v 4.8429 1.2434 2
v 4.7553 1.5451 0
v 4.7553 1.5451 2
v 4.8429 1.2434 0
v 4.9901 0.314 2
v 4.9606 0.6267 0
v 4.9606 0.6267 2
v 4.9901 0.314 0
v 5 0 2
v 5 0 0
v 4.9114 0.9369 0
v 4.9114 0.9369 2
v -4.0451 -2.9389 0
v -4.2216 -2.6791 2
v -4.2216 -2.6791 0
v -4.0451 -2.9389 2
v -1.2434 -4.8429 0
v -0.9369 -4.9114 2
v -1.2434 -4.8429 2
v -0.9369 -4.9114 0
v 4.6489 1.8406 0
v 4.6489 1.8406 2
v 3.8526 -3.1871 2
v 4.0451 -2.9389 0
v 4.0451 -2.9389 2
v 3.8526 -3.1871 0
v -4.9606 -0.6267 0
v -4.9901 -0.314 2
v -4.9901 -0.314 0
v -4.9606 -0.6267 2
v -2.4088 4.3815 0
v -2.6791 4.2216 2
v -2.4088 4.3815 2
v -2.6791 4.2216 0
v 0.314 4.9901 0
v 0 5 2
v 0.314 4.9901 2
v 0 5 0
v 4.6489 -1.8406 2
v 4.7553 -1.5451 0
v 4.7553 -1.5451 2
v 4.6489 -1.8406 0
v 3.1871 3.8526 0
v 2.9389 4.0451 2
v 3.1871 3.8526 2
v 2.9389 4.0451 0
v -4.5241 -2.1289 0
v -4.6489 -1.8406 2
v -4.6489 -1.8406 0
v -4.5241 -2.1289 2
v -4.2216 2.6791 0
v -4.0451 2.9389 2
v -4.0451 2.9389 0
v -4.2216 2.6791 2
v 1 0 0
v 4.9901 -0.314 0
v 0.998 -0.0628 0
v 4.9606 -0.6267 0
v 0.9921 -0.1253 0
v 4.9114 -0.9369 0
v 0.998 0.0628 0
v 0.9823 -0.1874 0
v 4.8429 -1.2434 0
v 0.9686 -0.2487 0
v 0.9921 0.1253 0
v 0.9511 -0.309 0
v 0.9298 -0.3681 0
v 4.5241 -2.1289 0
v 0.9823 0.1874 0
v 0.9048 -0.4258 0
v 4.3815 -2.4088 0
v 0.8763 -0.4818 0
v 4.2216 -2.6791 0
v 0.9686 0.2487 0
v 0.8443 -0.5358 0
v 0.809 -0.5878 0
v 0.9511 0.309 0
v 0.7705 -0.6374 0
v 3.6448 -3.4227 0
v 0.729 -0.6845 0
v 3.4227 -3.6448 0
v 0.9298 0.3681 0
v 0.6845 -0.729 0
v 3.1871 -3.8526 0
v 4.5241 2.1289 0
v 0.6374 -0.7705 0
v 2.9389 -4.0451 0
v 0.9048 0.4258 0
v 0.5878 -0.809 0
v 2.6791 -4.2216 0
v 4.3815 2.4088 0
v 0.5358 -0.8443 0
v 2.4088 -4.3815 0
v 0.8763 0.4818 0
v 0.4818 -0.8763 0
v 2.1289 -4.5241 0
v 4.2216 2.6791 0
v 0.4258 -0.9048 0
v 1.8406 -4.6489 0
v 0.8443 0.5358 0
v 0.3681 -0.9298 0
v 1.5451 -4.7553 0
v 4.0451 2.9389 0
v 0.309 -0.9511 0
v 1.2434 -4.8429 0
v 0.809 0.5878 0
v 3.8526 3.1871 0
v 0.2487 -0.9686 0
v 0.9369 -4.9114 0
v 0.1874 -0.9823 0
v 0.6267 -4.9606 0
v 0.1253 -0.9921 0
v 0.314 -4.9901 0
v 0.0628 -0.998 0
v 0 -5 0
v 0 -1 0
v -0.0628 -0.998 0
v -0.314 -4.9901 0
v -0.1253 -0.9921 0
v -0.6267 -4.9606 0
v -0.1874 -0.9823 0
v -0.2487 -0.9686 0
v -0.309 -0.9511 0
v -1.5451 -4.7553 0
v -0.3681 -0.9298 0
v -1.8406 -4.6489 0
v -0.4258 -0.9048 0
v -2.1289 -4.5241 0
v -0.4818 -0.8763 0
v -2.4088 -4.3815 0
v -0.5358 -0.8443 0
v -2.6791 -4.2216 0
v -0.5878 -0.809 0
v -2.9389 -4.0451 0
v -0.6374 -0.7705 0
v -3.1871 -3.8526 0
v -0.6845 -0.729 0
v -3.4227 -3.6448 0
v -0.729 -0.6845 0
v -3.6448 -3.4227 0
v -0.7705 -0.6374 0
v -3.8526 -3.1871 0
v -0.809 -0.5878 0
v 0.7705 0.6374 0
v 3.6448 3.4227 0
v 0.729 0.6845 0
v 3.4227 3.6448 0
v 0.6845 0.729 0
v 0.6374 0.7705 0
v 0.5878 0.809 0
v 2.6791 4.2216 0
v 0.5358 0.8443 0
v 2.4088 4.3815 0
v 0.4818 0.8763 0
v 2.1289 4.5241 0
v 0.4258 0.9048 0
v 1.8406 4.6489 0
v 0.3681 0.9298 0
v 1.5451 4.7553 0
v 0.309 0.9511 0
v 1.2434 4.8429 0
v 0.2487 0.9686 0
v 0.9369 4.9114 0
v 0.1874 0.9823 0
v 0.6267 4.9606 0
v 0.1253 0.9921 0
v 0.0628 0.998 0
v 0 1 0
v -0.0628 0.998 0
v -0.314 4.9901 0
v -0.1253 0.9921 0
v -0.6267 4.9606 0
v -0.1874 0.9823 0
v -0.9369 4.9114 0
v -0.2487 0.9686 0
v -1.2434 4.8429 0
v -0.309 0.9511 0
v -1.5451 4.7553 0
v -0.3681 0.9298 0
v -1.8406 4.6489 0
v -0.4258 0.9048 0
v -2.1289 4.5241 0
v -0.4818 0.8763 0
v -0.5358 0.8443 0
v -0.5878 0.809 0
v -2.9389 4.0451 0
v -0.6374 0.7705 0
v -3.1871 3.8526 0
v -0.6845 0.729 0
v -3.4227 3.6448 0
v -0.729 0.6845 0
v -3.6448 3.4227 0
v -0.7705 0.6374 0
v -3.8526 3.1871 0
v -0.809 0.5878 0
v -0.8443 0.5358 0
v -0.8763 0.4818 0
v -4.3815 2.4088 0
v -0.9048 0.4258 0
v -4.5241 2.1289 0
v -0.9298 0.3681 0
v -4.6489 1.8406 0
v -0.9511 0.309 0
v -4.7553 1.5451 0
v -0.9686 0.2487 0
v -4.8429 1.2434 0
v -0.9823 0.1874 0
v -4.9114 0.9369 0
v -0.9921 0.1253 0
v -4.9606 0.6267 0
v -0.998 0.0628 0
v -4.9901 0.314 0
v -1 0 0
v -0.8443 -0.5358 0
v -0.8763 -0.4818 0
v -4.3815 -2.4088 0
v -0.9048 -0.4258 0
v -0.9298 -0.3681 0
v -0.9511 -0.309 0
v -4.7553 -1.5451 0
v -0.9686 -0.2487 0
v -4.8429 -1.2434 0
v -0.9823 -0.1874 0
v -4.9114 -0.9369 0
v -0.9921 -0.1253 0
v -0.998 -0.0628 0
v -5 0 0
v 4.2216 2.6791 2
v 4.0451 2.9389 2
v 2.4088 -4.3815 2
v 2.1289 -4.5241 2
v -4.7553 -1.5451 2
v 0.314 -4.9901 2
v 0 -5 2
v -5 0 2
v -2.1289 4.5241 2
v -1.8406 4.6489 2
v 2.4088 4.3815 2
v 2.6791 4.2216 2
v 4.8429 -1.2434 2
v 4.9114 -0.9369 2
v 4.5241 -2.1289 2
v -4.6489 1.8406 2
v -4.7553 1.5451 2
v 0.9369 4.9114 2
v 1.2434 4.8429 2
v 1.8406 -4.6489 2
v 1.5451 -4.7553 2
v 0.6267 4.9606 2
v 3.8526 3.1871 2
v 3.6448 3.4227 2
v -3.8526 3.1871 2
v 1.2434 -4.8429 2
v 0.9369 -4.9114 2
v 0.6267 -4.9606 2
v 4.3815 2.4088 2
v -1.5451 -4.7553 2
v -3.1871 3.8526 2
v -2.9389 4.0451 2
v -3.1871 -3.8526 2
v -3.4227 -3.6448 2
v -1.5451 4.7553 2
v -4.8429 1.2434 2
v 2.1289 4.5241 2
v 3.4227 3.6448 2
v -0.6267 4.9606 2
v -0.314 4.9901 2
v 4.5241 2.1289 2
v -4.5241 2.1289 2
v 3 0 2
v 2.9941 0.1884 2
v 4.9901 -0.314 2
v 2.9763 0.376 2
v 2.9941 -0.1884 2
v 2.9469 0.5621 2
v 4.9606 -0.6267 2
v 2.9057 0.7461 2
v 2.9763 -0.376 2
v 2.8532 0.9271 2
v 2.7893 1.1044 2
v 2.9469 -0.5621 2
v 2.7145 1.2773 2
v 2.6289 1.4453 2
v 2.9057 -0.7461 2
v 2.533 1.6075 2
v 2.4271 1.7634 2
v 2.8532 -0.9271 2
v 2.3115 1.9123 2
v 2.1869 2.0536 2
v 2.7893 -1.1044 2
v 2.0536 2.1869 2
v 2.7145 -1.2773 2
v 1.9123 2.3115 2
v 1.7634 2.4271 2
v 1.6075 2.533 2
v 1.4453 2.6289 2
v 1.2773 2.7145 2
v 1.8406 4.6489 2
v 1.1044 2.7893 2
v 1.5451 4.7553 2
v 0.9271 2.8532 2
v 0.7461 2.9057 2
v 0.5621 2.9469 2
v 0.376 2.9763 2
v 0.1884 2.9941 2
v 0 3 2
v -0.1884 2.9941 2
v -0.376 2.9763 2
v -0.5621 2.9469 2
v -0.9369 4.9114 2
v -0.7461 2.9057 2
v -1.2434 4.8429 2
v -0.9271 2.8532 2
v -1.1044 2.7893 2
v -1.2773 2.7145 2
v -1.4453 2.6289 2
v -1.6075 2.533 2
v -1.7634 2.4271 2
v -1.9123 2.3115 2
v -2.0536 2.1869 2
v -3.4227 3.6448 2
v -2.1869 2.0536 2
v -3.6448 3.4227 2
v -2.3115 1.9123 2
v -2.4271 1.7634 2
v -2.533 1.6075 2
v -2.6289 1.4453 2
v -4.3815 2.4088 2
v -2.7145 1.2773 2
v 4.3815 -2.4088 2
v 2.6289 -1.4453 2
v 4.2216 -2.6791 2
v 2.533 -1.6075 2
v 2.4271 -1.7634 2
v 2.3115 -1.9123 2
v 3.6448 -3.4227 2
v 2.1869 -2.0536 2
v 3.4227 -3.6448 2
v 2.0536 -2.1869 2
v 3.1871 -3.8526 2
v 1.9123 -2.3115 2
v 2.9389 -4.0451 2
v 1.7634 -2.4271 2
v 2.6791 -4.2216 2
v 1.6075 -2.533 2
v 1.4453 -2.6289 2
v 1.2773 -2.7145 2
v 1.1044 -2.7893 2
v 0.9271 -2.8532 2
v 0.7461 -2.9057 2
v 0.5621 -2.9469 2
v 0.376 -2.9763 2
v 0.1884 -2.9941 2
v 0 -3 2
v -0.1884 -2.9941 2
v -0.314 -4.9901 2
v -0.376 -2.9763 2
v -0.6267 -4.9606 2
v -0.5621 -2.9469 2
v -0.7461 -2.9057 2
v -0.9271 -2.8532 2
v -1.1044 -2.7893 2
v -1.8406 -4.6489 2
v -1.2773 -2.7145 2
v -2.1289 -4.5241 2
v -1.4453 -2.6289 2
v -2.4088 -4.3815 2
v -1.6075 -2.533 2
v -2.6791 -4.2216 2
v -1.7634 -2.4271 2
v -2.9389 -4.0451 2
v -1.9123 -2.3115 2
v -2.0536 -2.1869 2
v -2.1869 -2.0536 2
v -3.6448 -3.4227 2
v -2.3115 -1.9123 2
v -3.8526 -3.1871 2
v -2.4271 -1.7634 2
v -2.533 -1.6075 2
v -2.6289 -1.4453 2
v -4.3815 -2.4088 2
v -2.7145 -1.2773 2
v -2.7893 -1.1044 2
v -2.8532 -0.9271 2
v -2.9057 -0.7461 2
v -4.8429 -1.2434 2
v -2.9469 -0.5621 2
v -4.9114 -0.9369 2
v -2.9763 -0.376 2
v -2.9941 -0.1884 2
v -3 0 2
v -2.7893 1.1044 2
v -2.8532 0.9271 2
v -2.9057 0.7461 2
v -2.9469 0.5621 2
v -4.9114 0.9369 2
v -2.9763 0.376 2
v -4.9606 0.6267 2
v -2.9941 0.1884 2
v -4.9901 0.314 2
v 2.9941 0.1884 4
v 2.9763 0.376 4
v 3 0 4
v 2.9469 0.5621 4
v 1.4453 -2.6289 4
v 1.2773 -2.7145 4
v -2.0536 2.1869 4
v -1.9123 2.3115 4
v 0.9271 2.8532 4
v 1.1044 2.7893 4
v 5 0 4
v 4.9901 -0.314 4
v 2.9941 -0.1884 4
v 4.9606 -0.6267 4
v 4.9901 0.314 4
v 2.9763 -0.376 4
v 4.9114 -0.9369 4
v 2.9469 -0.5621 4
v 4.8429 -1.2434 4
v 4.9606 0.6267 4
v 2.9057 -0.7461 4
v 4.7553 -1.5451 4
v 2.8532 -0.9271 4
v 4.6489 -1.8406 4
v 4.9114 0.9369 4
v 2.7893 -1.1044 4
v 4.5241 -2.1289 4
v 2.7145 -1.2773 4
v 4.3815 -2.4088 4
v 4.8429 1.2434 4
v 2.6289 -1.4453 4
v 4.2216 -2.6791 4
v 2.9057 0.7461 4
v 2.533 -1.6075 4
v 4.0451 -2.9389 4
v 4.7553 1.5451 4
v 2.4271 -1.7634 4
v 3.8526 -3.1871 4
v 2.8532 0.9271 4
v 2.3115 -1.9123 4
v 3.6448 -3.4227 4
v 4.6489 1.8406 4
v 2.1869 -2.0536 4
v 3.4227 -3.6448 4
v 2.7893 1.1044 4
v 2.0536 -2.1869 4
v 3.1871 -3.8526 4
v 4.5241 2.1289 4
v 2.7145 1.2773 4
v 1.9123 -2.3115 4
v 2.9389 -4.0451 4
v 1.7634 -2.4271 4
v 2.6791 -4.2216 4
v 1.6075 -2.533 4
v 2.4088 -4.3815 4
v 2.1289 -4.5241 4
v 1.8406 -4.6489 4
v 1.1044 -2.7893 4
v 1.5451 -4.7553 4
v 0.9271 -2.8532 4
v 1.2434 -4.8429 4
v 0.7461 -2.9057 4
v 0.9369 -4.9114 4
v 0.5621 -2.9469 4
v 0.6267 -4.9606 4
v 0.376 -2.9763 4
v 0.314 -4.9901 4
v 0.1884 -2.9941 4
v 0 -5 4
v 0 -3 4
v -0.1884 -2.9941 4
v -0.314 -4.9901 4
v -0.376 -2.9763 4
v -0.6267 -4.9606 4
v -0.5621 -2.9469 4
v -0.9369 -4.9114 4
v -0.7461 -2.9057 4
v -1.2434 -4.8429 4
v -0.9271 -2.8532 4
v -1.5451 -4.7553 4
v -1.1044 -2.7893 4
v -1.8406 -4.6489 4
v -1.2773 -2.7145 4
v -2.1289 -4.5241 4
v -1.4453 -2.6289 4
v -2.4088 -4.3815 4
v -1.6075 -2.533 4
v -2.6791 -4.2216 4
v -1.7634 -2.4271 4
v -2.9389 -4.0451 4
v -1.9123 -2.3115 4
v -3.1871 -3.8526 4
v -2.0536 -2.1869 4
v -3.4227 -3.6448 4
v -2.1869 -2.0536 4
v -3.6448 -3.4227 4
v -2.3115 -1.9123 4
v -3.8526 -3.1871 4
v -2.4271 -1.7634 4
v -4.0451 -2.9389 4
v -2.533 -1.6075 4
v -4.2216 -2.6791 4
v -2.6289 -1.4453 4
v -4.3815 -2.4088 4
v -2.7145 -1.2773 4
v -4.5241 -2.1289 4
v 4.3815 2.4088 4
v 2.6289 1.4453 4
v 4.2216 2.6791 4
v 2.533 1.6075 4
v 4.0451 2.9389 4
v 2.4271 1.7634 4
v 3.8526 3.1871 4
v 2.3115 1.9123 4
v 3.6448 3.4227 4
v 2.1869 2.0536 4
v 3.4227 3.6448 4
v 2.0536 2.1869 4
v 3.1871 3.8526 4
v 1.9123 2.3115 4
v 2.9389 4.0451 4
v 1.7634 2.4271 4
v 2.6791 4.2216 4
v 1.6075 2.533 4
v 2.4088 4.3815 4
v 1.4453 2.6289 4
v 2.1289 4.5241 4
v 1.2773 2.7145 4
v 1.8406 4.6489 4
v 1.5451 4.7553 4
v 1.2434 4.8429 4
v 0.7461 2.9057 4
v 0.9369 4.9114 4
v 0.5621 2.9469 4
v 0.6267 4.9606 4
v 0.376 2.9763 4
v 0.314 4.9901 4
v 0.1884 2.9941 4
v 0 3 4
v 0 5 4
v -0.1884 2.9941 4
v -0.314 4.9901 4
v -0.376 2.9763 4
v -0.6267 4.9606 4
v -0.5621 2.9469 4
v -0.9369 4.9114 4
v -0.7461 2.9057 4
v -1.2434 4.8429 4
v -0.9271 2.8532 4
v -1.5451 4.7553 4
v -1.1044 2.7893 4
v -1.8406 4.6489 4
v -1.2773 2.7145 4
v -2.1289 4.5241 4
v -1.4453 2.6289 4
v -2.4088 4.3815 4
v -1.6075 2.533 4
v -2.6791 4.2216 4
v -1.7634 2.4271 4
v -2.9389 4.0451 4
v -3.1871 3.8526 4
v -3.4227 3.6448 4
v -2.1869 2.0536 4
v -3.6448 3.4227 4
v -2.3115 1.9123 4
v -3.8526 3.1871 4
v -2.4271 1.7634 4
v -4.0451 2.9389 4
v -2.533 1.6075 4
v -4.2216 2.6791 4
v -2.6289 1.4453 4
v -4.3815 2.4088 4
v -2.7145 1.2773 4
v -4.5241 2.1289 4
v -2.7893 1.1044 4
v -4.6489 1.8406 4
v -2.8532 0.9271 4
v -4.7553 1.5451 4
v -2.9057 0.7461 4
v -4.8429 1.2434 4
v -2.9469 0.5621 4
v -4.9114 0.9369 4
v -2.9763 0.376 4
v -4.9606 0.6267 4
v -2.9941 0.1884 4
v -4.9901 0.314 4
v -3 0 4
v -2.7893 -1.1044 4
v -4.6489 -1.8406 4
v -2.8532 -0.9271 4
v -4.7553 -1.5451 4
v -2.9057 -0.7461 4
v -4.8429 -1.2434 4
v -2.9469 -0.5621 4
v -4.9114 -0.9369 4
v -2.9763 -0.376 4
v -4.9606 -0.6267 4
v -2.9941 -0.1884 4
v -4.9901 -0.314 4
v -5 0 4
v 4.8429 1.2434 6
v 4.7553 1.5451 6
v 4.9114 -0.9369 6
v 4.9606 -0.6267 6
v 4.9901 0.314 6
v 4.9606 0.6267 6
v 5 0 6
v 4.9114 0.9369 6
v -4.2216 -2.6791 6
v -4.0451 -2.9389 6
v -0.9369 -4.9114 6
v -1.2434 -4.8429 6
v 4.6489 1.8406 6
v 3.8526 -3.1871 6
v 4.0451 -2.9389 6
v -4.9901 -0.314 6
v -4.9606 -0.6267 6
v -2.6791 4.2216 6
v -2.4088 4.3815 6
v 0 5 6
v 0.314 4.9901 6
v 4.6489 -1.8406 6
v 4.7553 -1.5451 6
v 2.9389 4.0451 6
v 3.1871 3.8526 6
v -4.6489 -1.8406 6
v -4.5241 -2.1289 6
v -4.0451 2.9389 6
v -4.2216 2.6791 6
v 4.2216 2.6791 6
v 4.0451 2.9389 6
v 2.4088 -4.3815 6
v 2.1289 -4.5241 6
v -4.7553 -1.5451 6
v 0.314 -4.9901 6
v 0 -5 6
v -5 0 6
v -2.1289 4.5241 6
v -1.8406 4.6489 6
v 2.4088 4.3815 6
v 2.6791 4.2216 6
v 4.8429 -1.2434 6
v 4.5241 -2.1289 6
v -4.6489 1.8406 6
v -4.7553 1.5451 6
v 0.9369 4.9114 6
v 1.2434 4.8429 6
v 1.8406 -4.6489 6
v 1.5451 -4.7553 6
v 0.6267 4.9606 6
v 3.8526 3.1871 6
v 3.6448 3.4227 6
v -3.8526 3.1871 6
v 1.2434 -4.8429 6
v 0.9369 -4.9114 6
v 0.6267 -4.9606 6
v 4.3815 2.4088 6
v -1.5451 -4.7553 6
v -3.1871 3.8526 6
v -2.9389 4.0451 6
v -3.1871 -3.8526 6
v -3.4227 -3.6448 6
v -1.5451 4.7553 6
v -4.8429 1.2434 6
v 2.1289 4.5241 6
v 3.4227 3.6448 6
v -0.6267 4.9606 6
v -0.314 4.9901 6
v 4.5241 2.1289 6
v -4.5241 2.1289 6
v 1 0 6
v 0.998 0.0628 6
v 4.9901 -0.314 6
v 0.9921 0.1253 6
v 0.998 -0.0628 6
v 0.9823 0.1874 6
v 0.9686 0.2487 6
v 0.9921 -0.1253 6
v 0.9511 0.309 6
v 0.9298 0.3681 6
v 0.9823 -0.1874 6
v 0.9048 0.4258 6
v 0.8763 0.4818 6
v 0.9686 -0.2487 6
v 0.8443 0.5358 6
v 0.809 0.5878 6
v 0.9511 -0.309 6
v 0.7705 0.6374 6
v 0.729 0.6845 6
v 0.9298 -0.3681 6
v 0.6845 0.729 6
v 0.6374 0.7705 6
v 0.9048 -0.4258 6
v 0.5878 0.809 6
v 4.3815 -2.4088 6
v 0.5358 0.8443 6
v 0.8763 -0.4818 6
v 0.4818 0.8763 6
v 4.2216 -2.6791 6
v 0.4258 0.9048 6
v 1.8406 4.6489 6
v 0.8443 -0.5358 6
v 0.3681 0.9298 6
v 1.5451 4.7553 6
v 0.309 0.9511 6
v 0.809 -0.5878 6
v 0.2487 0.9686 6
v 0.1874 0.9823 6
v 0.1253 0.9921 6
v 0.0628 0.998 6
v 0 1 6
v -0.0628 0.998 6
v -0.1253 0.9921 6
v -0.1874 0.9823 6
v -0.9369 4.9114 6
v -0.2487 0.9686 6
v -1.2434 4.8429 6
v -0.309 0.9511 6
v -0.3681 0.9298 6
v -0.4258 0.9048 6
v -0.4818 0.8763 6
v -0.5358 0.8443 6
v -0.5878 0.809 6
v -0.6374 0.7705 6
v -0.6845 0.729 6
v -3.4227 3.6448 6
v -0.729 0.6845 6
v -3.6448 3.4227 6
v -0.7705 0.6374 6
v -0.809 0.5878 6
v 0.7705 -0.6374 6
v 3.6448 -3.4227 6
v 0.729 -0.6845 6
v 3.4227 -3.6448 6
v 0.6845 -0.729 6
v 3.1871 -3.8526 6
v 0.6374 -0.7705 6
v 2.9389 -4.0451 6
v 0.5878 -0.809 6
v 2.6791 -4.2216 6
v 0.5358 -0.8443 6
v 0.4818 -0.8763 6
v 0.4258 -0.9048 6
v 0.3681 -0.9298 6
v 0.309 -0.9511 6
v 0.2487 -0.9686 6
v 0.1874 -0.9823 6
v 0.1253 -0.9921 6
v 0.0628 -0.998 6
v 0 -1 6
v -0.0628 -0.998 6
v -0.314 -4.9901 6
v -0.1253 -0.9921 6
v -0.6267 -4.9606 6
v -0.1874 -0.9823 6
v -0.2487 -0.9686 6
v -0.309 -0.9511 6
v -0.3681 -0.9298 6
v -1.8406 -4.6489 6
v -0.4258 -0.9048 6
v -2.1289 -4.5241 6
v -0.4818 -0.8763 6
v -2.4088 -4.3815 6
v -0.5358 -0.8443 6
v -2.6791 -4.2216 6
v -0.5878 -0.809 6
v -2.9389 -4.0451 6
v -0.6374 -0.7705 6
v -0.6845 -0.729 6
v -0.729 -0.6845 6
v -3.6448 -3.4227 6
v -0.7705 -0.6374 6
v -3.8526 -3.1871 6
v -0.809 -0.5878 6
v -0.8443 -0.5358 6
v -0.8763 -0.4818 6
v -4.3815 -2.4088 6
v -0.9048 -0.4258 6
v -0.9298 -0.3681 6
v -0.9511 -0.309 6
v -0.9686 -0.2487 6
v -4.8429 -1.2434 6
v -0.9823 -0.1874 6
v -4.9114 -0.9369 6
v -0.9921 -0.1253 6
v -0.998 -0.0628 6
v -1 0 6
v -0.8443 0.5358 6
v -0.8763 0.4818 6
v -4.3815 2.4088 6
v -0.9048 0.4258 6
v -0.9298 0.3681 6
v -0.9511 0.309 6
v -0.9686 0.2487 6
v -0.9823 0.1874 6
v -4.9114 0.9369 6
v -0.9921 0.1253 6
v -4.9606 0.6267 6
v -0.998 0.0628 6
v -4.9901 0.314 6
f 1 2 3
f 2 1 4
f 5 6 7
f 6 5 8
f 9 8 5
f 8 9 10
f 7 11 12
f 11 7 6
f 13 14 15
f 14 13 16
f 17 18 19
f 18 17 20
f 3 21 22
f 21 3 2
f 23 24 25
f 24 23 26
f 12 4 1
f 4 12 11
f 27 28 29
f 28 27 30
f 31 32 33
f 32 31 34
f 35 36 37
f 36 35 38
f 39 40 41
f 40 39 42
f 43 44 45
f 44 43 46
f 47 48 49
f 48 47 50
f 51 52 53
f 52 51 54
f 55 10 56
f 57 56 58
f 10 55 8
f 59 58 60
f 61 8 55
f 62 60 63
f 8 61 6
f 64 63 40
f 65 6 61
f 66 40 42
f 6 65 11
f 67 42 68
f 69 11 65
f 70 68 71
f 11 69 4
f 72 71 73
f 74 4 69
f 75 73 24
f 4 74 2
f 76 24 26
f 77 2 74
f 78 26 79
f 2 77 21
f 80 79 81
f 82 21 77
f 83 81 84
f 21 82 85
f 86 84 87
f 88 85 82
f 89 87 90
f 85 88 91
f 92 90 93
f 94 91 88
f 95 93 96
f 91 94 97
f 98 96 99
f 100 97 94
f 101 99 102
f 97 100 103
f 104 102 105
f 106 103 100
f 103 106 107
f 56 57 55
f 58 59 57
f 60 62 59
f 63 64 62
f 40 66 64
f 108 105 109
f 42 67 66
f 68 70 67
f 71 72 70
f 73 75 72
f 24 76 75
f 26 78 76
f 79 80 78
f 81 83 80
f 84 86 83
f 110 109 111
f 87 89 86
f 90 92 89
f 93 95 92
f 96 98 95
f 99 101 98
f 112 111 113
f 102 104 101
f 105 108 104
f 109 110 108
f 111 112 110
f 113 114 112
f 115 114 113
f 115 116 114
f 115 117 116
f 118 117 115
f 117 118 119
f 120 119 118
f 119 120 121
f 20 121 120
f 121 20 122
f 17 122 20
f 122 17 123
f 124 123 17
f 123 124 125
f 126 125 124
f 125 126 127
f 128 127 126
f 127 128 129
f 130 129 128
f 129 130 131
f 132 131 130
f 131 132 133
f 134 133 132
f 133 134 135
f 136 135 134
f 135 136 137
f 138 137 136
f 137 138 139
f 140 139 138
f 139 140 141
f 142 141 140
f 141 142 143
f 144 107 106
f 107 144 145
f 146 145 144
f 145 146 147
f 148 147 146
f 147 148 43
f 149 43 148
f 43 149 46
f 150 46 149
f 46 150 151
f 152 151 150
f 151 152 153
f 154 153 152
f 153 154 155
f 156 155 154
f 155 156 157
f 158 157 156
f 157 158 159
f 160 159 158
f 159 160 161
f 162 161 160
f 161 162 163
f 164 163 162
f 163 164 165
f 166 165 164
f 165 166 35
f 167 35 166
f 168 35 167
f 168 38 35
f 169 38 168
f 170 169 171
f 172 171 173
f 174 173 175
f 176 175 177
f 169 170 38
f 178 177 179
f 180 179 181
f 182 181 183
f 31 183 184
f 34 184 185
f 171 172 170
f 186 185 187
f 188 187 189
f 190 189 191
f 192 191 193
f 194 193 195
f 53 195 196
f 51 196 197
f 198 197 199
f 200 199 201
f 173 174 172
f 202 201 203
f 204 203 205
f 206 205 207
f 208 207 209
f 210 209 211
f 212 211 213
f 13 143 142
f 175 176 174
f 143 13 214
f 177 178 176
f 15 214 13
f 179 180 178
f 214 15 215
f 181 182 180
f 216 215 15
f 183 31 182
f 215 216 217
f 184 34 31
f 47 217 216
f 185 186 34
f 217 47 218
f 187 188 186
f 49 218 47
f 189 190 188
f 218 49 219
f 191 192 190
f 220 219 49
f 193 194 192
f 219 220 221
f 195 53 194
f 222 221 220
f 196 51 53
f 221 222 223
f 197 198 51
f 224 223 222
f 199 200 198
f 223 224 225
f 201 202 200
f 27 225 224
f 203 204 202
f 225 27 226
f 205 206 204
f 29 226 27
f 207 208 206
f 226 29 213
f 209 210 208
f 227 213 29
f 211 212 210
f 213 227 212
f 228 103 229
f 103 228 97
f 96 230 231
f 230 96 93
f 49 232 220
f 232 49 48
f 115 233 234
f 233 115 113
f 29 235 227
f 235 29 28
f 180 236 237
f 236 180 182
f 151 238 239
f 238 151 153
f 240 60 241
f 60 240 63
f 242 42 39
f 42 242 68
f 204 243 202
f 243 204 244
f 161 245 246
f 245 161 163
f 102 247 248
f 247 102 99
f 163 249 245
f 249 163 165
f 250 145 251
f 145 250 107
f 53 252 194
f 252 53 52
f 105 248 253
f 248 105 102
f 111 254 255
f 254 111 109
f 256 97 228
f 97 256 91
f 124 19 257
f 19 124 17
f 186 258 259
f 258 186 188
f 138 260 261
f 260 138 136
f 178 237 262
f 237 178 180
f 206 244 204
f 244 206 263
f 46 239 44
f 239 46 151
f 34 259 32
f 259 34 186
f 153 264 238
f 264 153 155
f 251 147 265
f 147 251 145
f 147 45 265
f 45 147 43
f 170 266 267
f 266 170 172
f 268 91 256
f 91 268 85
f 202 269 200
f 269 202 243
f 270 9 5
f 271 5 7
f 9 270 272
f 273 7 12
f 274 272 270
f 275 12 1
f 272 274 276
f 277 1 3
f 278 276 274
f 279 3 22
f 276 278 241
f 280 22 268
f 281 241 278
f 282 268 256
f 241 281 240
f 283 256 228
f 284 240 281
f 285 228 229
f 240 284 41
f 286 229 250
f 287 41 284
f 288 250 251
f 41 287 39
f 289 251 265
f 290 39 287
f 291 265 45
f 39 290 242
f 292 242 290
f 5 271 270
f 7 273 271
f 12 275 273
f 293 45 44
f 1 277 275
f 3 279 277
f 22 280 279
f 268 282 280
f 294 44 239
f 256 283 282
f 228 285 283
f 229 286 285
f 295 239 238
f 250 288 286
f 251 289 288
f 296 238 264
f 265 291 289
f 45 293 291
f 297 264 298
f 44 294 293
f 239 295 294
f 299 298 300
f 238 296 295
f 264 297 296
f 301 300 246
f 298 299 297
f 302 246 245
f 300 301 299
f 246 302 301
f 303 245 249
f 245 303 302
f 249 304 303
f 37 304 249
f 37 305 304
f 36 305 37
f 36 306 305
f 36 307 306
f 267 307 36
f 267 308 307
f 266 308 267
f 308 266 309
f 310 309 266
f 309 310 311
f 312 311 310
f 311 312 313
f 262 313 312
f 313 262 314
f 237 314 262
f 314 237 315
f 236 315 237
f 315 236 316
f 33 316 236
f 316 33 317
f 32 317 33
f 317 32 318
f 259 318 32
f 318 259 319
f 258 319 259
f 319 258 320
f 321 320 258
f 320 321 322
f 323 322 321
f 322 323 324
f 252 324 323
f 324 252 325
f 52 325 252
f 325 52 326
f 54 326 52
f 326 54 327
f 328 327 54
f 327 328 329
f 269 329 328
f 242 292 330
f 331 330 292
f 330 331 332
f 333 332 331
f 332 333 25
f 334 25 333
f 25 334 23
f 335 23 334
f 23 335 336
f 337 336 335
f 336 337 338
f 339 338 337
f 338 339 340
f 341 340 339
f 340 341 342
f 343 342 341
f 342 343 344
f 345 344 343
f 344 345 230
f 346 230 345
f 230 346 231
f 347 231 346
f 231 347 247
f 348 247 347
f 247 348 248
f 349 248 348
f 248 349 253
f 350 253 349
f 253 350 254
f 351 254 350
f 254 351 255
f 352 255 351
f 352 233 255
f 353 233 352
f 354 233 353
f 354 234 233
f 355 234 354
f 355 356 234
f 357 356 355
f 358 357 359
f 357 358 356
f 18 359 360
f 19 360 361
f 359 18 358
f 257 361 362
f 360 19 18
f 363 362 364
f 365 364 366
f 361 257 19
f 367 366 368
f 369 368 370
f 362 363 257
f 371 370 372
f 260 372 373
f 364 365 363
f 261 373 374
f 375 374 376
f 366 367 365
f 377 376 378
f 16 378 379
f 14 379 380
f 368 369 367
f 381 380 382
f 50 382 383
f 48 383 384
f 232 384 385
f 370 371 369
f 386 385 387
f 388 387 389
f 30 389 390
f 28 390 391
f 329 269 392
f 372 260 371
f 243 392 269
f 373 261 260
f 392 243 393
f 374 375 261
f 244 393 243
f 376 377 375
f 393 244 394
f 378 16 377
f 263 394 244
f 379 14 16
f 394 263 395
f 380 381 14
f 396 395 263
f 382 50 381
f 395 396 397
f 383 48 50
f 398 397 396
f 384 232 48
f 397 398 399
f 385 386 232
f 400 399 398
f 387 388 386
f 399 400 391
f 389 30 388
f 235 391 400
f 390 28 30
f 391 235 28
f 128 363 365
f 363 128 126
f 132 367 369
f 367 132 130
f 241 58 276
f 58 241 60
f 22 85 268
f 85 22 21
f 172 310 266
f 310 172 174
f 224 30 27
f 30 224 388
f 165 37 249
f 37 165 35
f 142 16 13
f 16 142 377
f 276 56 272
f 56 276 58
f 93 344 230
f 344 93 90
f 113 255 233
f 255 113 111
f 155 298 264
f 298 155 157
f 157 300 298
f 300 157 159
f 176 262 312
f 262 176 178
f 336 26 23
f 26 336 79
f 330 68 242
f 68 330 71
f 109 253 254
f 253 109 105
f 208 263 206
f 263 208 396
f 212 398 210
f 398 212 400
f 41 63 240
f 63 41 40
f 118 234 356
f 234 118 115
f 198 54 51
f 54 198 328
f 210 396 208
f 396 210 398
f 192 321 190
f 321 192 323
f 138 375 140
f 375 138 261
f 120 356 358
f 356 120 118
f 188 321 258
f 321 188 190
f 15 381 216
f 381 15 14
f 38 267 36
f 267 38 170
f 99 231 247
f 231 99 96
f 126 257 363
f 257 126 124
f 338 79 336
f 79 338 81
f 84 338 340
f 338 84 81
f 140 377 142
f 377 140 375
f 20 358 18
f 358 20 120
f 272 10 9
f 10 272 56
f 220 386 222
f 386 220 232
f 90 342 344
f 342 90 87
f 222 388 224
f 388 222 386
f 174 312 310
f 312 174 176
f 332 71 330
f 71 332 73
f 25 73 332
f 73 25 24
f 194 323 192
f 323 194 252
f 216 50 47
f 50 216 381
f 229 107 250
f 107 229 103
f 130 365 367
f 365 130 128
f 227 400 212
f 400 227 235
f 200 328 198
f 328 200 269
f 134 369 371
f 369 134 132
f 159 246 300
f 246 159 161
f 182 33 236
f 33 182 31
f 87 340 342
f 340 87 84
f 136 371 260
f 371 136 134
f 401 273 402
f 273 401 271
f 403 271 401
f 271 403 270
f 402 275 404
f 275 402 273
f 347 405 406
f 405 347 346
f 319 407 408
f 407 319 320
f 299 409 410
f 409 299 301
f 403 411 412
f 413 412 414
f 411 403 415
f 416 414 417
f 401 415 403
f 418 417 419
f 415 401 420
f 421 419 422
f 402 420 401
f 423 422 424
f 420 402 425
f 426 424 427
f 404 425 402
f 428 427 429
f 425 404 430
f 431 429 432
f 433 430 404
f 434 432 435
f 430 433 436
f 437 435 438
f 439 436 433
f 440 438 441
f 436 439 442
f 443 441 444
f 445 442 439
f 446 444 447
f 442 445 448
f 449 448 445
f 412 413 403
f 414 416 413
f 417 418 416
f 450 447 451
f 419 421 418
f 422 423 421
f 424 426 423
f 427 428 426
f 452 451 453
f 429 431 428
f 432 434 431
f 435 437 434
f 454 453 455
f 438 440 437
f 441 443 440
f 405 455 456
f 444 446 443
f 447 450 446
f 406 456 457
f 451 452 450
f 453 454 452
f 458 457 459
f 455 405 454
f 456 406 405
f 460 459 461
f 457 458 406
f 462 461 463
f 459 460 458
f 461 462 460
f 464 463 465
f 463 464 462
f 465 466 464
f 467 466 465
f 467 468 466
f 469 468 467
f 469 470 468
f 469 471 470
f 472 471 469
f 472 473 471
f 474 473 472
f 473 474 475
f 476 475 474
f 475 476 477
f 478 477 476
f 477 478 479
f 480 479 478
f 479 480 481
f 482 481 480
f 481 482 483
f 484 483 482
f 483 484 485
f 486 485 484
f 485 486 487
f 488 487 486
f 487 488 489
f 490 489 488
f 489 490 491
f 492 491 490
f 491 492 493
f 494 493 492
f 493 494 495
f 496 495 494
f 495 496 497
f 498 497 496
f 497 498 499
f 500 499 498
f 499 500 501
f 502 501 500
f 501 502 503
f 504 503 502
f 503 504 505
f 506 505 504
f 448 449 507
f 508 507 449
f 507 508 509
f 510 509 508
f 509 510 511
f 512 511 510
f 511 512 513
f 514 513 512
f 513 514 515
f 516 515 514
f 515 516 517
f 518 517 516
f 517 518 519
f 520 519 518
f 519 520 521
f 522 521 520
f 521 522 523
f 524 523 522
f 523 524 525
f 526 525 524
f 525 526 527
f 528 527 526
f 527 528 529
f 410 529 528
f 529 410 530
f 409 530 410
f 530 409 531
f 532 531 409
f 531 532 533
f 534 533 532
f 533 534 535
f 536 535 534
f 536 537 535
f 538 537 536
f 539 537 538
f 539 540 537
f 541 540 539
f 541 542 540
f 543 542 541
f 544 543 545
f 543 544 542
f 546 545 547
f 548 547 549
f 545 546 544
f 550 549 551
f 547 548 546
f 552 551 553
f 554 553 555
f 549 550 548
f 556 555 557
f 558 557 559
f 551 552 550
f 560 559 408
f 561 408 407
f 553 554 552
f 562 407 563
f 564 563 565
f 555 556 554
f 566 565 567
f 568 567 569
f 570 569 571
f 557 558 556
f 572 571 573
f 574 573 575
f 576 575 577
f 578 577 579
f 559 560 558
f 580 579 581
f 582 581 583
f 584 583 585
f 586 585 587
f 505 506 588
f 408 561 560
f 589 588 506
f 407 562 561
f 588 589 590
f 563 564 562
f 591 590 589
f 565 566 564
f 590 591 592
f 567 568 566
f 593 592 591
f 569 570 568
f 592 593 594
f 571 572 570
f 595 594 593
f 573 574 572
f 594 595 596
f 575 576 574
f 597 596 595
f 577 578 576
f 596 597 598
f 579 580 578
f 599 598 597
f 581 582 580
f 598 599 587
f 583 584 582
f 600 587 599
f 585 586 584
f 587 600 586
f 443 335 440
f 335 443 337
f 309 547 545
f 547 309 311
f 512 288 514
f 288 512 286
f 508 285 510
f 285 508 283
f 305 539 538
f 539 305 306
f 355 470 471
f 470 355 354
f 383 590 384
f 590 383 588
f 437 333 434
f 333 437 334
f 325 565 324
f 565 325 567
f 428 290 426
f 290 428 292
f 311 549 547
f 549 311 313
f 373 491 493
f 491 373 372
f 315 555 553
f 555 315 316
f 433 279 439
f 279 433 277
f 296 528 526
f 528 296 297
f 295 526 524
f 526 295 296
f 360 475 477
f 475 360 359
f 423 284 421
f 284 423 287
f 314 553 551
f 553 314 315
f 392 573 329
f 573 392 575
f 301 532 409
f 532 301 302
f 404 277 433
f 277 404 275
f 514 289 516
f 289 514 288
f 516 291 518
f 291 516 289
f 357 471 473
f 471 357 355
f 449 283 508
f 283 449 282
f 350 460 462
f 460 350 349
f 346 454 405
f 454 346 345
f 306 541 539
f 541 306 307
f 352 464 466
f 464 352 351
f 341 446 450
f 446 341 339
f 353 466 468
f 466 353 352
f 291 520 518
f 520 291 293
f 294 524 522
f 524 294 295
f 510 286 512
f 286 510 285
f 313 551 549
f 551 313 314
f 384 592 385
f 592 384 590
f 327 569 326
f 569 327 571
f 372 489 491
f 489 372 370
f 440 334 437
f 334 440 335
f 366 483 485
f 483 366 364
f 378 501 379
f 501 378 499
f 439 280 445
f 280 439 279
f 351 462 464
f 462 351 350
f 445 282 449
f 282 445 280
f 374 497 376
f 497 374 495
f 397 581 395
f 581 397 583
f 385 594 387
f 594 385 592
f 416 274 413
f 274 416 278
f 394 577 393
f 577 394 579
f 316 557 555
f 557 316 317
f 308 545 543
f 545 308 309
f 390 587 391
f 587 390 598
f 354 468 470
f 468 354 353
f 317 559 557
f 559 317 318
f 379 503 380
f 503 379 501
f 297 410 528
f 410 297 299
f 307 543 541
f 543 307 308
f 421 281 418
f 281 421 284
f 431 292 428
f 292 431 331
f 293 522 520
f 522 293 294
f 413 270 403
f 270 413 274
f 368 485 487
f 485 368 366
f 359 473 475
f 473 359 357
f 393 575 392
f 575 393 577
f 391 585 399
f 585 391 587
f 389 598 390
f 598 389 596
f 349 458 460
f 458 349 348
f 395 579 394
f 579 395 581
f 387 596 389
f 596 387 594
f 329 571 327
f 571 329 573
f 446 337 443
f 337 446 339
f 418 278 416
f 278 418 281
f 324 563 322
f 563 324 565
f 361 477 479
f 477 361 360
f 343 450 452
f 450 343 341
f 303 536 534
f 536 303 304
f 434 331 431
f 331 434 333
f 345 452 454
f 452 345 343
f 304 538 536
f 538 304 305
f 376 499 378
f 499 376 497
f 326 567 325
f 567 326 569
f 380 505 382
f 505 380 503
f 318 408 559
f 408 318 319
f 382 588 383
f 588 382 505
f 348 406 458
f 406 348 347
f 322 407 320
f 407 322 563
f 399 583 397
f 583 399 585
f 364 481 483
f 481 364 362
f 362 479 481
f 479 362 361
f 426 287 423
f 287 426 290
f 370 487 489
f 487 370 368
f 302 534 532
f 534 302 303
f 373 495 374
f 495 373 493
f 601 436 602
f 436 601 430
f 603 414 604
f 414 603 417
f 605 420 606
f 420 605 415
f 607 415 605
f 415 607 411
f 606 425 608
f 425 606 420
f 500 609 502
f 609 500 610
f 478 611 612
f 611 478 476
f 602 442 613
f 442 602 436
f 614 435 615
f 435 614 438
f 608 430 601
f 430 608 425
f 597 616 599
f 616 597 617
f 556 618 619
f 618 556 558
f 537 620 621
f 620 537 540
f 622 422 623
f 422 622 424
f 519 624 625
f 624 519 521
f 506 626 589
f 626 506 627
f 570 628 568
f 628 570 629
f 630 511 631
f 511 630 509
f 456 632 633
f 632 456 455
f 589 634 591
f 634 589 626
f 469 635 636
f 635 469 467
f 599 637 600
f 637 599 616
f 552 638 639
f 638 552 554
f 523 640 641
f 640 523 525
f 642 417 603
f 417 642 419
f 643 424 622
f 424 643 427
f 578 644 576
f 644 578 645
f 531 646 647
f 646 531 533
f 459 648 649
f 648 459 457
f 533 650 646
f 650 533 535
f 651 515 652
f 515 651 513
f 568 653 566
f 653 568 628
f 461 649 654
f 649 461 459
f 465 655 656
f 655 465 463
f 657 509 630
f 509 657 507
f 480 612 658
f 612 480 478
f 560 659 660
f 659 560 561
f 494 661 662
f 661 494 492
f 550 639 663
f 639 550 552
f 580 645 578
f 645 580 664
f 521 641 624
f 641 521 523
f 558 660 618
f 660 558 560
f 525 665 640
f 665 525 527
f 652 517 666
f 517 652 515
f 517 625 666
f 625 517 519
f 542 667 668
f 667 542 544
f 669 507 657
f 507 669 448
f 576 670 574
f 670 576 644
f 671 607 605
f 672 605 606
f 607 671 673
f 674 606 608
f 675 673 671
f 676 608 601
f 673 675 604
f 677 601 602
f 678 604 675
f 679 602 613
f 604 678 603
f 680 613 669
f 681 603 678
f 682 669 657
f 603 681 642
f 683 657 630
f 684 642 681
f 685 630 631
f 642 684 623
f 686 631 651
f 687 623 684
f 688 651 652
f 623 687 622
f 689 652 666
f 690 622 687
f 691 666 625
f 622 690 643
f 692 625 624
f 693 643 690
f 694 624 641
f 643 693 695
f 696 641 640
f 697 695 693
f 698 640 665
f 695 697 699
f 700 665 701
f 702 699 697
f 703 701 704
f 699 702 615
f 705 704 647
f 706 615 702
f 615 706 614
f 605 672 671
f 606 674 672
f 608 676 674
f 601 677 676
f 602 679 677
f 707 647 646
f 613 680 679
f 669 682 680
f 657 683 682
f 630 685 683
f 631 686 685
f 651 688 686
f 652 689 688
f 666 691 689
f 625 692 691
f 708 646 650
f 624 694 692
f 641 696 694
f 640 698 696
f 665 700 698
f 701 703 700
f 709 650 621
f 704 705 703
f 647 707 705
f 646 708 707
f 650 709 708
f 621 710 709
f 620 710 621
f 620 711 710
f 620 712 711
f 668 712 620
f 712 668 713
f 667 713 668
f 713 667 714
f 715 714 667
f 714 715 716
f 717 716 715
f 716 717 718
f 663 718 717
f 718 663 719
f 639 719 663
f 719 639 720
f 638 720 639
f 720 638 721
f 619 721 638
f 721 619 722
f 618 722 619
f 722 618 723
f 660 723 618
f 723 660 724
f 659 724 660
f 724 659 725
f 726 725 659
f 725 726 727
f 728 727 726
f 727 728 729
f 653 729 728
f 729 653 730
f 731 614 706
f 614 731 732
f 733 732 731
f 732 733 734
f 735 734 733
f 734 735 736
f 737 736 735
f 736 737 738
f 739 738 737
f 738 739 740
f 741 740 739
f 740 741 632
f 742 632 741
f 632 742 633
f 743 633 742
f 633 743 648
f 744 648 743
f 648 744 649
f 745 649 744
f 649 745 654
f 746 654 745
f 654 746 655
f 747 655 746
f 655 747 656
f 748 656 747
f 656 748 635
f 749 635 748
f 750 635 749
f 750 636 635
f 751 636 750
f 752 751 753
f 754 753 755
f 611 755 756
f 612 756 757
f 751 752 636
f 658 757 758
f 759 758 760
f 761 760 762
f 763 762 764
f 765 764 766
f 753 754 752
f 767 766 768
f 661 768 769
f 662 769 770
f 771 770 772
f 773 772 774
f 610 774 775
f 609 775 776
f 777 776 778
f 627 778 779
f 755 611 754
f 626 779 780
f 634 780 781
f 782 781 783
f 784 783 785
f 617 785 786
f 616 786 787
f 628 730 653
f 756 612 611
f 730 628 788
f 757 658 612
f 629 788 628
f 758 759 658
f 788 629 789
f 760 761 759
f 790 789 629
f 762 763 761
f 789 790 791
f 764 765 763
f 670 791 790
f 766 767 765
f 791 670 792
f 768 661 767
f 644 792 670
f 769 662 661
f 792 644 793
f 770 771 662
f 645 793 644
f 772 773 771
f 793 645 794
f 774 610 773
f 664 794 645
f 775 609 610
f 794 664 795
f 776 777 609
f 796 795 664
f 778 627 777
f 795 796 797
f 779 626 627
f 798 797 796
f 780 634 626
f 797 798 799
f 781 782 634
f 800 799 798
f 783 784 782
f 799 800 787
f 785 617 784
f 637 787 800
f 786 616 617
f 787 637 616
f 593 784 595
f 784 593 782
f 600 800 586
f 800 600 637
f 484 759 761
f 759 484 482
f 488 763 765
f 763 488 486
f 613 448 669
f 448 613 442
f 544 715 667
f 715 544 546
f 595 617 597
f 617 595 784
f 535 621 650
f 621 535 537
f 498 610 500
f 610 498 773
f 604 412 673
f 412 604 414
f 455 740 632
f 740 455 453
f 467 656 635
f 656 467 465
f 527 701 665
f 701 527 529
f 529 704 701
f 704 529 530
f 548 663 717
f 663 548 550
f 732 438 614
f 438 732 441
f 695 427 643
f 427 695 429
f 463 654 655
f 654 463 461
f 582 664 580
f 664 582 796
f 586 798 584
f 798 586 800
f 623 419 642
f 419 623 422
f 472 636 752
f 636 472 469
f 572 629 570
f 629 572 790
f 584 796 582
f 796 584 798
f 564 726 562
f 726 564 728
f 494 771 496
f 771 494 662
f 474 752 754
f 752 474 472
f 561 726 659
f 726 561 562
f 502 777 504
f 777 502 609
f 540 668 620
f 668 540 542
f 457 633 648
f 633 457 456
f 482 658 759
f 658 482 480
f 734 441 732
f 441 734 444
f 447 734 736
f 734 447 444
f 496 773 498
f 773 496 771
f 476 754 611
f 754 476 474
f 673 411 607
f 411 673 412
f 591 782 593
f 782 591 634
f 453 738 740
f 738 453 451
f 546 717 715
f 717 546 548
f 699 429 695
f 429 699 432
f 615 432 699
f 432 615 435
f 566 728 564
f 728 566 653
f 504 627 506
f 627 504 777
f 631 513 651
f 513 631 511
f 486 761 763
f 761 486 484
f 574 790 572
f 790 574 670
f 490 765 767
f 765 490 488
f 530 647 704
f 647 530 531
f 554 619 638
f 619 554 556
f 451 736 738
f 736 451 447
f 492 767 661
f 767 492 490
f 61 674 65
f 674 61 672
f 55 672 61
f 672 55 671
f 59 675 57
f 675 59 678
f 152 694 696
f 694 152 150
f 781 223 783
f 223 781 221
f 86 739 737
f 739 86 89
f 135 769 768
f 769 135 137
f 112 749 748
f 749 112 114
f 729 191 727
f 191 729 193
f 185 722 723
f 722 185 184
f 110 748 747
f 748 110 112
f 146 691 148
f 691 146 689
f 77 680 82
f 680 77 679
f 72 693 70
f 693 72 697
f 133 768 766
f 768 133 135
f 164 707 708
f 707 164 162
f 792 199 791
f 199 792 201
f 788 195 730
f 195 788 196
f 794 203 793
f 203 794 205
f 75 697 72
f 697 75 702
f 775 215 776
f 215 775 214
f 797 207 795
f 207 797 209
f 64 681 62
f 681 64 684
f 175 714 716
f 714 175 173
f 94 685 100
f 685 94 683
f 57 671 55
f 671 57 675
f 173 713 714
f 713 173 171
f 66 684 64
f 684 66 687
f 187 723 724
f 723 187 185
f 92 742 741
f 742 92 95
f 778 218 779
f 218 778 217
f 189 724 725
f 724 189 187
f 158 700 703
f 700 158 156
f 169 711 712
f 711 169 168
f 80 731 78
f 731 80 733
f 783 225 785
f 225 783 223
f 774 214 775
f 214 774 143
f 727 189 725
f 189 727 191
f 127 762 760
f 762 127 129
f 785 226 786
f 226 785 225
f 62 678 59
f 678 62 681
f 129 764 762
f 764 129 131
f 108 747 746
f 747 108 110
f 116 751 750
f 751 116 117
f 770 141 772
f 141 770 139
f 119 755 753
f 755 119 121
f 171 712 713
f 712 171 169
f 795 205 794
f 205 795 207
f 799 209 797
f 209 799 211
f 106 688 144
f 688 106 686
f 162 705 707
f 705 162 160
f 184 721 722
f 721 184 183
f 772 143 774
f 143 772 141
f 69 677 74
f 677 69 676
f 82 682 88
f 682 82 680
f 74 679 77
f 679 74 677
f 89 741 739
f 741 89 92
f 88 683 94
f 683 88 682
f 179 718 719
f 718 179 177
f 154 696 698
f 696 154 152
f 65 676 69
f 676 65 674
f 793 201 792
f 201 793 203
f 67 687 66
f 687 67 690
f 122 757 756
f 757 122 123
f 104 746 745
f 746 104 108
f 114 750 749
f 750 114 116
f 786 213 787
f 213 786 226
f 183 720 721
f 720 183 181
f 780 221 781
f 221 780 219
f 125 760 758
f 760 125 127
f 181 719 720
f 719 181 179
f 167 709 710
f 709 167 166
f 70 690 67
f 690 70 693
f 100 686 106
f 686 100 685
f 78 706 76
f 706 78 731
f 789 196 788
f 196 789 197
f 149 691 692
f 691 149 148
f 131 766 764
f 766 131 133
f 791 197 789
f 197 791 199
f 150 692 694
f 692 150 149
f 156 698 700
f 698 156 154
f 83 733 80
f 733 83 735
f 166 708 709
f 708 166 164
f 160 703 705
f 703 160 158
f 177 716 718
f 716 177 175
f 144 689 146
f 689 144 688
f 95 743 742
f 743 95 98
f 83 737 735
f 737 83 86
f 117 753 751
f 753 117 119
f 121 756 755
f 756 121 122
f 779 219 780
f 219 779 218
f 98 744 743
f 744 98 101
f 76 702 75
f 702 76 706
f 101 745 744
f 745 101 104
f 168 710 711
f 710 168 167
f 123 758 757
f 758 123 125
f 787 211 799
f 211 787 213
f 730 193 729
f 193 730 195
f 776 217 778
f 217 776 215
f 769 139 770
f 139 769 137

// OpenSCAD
rubberBandHolder(5,1);

module rubberBandHolder(radius,holdRadius){
	
	difference(){
		union() {

			cylinder(h=2, r=radius, $fn=100);
      
      translate([0,0,2]){
        cylinder(h=2, r=radius-2, $fn=100);
      }
      
      translate([0,0,4]){
        cylinder(h=2, r=radius, $fn=100);
      }
    } 
    
    cylinder(h=6, r=holdRadius, $fn=100);
    
  }
}
